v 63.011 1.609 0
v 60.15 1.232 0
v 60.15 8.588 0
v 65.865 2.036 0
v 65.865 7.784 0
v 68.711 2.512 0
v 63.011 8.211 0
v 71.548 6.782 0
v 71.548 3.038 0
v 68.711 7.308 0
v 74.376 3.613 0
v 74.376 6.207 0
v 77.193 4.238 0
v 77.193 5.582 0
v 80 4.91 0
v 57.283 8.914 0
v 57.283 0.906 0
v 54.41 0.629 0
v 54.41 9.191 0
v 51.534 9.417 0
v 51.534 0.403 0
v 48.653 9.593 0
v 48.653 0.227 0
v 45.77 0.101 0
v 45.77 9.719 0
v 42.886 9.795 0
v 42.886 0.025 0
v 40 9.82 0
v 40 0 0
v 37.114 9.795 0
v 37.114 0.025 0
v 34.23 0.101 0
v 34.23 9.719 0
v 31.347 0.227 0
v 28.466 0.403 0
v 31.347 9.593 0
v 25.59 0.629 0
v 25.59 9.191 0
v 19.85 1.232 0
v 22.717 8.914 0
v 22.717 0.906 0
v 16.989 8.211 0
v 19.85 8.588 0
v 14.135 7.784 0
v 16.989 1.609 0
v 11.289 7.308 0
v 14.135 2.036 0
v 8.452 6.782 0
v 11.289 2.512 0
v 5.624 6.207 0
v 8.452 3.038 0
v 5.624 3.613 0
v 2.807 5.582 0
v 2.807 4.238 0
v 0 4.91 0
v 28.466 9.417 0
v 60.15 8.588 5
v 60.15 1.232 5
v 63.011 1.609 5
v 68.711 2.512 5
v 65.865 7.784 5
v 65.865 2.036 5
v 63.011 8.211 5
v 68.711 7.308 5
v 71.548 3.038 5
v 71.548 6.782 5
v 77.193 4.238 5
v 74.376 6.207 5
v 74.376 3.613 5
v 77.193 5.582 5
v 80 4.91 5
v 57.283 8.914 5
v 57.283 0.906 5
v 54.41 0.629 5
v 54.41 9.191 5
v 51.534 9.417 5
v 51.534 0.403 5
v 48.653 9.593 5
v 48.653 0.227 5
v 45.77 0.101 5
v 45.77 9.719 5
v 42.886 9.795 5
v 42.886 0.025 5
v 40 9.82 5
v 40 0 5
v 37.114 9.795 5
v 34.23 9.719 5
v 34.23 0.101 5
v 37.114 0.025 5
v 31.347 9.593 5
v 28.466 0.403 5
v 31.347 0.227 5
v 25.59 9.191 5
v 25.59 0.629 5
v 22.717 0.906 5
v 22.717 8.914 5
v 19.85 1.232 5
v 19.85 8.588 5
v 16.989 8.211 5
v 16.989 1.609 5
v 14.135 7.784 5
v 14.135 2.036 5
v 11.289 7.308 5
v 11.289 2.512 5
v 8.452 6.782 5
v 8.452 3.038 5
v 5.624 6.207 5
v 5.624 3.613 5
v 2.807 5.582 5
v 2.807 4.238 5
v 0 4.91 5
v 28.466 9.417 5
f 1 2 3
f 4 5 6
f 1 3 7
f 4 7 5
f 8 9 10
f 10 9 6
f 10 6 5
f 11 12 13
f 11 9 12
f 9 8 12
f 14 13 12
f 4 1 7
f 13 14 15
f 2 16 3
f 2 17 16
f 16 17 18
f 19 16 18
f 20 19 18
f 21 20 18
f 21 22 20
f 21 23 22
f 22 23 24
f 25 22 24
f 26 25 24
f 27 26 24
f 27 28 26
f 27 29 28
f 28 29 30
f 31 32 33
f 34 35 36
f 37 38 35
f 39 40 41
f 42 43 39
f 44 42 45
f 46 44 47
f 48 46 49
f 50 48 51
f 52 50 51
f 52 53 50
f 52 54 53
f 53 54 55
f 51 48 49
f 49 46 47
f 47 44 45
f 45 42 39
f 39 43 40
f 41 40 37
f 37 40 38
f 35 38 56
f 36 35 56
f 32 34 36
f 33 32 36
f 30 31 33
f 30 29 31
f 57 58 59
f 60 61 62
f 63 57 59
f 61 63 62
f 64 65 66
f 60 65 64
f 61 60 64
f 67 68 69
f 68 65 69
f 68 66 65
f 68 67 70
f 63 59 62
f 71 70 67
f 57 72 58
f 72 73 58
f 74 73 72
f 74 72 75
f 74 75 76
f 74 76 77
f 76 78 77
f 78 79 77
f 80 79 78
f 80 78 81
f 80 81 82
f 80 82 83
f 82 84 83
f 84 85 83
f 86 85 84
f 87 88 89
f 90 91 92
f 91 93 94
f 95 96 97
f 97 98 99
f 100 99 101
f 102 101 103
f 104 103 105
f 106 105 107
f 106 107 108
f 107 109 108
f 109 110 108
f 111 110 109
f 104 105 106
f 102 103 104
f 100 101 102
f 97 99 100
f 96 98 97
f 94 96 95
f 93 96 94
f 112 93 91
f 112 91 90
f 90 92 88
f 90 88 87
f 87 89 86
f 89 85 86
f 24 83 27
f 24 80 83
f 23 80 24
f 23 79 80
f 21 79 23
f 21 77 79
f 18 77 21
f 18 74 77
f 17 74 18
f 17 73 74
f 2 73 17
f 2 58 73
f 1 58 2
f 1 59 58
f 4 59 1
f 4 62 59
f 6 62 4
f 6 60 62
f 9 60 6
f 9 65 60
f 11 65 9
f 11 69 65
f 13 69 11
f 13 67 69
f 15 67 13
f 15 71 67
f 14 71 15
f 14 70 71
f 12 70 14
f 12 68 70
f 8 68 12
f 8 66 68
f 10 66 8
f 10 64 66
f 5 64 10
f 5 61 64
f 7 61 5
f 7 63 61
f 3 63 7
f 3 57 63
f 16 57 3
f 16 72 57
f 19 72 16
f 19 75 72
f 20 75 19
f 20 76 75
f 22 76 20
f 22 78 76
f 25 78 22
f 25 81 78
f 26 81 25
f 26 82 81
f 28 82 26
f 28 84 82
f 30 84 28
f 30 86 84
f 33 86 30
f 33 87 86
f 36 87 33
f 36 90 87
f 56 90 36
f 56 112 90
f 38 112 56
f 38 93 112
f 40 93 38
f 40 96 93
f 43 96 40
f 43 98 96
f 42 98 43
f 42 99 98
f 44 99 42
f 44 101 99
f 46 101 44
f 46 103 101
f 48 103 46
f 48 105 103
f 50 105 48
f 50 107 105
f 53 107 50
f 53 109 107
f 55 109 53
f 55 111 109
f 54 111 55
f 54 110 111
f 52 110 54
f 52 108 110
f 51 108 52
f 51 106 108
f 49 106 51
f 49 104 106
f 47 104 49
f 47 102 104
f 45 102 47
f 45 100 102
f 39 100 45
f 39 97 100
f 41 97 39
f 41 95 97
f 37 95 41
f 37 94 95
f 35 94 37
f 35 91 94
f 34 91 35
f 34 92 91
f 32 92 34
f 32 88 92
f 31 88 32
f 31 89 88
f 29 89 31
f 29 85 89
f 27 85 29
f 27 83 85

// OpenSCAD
$fn = 32;

// ----------------------------------------------------------------------
// Arc profile plate: lens, 56 points
// ----------------------------------------------------------------------

// --- parameters (mm) ---
lens_chord = 80;          // chord length of the lens, X
arc_r = 165.34;           // radius of both arcs
arc_angle = 28;           // angle of each arc, degrees
sagitta = 4.91;           // bulge of each arc (half the lens height)
arc_step = 1;             // sampling step of the arcs, degrees
plate_t = 5;              // plate thickness, Z
fit_tol = 0.05;           // declared fit tolerance (prompt contract)
free_tol = 0.2;           // declared free tolerance (prompt contract)

bbox_y = 2 * sagitta;  // full lens height

profile = [[80, 4.91], [77.193, 5.582], [74.376, 6.207], [71.548, 6.782], [68.711, 7.308], [65.865, 7.784], [63.011, 8.211], [60.15, 8.588], [57.283, 8.914], [54.41, 9.191], [51.534, 9.417], [48.653, 9.593], [45.77, 9.719], [42.886, 9.795], [40, 9.82], [37.114, 9.795], [34.23, 9.719], [31.347, 9.593], [28.466, 9.417], [25.59, 9.191], [22.717, 8.914], [19.85, 8.588], [16.989, 8.211], [14.135, 7.784], [11.289, 7.308], [8.452, 6.782], [5.624, 6.207], [2.807, 5.582], [0, 4.91], [2.807, 4.238], [5.624, 3.613], [8.452, 3.038], [11.289, 2.512], [14.135, 2.036], [16.989, 1.609], [19.85, 1.232], [22.717, 0.906], [25.59, 0.629], [28.466, 0.403], [31.347, 0.227], [34.23, 0.101], [37.114, 0.025], [40, 0], [42.886, 0.025], [45.77, 0.101], [48.653, 0.227], [51.534, 0.403], [54.41, 0.629], [57.283, 0.906], [60.15, 1.232], [63.011, 1.609], [65.865, 2.036], [68.711, 2.512], [71.548, 3.038], [74.376, 3.613], [77.193, 4.238]];  // primary outline, 56 points, counter clockwise

// --- the one profile operation ---
linear_extrude(height = plate_t) polygon(points = profile);
